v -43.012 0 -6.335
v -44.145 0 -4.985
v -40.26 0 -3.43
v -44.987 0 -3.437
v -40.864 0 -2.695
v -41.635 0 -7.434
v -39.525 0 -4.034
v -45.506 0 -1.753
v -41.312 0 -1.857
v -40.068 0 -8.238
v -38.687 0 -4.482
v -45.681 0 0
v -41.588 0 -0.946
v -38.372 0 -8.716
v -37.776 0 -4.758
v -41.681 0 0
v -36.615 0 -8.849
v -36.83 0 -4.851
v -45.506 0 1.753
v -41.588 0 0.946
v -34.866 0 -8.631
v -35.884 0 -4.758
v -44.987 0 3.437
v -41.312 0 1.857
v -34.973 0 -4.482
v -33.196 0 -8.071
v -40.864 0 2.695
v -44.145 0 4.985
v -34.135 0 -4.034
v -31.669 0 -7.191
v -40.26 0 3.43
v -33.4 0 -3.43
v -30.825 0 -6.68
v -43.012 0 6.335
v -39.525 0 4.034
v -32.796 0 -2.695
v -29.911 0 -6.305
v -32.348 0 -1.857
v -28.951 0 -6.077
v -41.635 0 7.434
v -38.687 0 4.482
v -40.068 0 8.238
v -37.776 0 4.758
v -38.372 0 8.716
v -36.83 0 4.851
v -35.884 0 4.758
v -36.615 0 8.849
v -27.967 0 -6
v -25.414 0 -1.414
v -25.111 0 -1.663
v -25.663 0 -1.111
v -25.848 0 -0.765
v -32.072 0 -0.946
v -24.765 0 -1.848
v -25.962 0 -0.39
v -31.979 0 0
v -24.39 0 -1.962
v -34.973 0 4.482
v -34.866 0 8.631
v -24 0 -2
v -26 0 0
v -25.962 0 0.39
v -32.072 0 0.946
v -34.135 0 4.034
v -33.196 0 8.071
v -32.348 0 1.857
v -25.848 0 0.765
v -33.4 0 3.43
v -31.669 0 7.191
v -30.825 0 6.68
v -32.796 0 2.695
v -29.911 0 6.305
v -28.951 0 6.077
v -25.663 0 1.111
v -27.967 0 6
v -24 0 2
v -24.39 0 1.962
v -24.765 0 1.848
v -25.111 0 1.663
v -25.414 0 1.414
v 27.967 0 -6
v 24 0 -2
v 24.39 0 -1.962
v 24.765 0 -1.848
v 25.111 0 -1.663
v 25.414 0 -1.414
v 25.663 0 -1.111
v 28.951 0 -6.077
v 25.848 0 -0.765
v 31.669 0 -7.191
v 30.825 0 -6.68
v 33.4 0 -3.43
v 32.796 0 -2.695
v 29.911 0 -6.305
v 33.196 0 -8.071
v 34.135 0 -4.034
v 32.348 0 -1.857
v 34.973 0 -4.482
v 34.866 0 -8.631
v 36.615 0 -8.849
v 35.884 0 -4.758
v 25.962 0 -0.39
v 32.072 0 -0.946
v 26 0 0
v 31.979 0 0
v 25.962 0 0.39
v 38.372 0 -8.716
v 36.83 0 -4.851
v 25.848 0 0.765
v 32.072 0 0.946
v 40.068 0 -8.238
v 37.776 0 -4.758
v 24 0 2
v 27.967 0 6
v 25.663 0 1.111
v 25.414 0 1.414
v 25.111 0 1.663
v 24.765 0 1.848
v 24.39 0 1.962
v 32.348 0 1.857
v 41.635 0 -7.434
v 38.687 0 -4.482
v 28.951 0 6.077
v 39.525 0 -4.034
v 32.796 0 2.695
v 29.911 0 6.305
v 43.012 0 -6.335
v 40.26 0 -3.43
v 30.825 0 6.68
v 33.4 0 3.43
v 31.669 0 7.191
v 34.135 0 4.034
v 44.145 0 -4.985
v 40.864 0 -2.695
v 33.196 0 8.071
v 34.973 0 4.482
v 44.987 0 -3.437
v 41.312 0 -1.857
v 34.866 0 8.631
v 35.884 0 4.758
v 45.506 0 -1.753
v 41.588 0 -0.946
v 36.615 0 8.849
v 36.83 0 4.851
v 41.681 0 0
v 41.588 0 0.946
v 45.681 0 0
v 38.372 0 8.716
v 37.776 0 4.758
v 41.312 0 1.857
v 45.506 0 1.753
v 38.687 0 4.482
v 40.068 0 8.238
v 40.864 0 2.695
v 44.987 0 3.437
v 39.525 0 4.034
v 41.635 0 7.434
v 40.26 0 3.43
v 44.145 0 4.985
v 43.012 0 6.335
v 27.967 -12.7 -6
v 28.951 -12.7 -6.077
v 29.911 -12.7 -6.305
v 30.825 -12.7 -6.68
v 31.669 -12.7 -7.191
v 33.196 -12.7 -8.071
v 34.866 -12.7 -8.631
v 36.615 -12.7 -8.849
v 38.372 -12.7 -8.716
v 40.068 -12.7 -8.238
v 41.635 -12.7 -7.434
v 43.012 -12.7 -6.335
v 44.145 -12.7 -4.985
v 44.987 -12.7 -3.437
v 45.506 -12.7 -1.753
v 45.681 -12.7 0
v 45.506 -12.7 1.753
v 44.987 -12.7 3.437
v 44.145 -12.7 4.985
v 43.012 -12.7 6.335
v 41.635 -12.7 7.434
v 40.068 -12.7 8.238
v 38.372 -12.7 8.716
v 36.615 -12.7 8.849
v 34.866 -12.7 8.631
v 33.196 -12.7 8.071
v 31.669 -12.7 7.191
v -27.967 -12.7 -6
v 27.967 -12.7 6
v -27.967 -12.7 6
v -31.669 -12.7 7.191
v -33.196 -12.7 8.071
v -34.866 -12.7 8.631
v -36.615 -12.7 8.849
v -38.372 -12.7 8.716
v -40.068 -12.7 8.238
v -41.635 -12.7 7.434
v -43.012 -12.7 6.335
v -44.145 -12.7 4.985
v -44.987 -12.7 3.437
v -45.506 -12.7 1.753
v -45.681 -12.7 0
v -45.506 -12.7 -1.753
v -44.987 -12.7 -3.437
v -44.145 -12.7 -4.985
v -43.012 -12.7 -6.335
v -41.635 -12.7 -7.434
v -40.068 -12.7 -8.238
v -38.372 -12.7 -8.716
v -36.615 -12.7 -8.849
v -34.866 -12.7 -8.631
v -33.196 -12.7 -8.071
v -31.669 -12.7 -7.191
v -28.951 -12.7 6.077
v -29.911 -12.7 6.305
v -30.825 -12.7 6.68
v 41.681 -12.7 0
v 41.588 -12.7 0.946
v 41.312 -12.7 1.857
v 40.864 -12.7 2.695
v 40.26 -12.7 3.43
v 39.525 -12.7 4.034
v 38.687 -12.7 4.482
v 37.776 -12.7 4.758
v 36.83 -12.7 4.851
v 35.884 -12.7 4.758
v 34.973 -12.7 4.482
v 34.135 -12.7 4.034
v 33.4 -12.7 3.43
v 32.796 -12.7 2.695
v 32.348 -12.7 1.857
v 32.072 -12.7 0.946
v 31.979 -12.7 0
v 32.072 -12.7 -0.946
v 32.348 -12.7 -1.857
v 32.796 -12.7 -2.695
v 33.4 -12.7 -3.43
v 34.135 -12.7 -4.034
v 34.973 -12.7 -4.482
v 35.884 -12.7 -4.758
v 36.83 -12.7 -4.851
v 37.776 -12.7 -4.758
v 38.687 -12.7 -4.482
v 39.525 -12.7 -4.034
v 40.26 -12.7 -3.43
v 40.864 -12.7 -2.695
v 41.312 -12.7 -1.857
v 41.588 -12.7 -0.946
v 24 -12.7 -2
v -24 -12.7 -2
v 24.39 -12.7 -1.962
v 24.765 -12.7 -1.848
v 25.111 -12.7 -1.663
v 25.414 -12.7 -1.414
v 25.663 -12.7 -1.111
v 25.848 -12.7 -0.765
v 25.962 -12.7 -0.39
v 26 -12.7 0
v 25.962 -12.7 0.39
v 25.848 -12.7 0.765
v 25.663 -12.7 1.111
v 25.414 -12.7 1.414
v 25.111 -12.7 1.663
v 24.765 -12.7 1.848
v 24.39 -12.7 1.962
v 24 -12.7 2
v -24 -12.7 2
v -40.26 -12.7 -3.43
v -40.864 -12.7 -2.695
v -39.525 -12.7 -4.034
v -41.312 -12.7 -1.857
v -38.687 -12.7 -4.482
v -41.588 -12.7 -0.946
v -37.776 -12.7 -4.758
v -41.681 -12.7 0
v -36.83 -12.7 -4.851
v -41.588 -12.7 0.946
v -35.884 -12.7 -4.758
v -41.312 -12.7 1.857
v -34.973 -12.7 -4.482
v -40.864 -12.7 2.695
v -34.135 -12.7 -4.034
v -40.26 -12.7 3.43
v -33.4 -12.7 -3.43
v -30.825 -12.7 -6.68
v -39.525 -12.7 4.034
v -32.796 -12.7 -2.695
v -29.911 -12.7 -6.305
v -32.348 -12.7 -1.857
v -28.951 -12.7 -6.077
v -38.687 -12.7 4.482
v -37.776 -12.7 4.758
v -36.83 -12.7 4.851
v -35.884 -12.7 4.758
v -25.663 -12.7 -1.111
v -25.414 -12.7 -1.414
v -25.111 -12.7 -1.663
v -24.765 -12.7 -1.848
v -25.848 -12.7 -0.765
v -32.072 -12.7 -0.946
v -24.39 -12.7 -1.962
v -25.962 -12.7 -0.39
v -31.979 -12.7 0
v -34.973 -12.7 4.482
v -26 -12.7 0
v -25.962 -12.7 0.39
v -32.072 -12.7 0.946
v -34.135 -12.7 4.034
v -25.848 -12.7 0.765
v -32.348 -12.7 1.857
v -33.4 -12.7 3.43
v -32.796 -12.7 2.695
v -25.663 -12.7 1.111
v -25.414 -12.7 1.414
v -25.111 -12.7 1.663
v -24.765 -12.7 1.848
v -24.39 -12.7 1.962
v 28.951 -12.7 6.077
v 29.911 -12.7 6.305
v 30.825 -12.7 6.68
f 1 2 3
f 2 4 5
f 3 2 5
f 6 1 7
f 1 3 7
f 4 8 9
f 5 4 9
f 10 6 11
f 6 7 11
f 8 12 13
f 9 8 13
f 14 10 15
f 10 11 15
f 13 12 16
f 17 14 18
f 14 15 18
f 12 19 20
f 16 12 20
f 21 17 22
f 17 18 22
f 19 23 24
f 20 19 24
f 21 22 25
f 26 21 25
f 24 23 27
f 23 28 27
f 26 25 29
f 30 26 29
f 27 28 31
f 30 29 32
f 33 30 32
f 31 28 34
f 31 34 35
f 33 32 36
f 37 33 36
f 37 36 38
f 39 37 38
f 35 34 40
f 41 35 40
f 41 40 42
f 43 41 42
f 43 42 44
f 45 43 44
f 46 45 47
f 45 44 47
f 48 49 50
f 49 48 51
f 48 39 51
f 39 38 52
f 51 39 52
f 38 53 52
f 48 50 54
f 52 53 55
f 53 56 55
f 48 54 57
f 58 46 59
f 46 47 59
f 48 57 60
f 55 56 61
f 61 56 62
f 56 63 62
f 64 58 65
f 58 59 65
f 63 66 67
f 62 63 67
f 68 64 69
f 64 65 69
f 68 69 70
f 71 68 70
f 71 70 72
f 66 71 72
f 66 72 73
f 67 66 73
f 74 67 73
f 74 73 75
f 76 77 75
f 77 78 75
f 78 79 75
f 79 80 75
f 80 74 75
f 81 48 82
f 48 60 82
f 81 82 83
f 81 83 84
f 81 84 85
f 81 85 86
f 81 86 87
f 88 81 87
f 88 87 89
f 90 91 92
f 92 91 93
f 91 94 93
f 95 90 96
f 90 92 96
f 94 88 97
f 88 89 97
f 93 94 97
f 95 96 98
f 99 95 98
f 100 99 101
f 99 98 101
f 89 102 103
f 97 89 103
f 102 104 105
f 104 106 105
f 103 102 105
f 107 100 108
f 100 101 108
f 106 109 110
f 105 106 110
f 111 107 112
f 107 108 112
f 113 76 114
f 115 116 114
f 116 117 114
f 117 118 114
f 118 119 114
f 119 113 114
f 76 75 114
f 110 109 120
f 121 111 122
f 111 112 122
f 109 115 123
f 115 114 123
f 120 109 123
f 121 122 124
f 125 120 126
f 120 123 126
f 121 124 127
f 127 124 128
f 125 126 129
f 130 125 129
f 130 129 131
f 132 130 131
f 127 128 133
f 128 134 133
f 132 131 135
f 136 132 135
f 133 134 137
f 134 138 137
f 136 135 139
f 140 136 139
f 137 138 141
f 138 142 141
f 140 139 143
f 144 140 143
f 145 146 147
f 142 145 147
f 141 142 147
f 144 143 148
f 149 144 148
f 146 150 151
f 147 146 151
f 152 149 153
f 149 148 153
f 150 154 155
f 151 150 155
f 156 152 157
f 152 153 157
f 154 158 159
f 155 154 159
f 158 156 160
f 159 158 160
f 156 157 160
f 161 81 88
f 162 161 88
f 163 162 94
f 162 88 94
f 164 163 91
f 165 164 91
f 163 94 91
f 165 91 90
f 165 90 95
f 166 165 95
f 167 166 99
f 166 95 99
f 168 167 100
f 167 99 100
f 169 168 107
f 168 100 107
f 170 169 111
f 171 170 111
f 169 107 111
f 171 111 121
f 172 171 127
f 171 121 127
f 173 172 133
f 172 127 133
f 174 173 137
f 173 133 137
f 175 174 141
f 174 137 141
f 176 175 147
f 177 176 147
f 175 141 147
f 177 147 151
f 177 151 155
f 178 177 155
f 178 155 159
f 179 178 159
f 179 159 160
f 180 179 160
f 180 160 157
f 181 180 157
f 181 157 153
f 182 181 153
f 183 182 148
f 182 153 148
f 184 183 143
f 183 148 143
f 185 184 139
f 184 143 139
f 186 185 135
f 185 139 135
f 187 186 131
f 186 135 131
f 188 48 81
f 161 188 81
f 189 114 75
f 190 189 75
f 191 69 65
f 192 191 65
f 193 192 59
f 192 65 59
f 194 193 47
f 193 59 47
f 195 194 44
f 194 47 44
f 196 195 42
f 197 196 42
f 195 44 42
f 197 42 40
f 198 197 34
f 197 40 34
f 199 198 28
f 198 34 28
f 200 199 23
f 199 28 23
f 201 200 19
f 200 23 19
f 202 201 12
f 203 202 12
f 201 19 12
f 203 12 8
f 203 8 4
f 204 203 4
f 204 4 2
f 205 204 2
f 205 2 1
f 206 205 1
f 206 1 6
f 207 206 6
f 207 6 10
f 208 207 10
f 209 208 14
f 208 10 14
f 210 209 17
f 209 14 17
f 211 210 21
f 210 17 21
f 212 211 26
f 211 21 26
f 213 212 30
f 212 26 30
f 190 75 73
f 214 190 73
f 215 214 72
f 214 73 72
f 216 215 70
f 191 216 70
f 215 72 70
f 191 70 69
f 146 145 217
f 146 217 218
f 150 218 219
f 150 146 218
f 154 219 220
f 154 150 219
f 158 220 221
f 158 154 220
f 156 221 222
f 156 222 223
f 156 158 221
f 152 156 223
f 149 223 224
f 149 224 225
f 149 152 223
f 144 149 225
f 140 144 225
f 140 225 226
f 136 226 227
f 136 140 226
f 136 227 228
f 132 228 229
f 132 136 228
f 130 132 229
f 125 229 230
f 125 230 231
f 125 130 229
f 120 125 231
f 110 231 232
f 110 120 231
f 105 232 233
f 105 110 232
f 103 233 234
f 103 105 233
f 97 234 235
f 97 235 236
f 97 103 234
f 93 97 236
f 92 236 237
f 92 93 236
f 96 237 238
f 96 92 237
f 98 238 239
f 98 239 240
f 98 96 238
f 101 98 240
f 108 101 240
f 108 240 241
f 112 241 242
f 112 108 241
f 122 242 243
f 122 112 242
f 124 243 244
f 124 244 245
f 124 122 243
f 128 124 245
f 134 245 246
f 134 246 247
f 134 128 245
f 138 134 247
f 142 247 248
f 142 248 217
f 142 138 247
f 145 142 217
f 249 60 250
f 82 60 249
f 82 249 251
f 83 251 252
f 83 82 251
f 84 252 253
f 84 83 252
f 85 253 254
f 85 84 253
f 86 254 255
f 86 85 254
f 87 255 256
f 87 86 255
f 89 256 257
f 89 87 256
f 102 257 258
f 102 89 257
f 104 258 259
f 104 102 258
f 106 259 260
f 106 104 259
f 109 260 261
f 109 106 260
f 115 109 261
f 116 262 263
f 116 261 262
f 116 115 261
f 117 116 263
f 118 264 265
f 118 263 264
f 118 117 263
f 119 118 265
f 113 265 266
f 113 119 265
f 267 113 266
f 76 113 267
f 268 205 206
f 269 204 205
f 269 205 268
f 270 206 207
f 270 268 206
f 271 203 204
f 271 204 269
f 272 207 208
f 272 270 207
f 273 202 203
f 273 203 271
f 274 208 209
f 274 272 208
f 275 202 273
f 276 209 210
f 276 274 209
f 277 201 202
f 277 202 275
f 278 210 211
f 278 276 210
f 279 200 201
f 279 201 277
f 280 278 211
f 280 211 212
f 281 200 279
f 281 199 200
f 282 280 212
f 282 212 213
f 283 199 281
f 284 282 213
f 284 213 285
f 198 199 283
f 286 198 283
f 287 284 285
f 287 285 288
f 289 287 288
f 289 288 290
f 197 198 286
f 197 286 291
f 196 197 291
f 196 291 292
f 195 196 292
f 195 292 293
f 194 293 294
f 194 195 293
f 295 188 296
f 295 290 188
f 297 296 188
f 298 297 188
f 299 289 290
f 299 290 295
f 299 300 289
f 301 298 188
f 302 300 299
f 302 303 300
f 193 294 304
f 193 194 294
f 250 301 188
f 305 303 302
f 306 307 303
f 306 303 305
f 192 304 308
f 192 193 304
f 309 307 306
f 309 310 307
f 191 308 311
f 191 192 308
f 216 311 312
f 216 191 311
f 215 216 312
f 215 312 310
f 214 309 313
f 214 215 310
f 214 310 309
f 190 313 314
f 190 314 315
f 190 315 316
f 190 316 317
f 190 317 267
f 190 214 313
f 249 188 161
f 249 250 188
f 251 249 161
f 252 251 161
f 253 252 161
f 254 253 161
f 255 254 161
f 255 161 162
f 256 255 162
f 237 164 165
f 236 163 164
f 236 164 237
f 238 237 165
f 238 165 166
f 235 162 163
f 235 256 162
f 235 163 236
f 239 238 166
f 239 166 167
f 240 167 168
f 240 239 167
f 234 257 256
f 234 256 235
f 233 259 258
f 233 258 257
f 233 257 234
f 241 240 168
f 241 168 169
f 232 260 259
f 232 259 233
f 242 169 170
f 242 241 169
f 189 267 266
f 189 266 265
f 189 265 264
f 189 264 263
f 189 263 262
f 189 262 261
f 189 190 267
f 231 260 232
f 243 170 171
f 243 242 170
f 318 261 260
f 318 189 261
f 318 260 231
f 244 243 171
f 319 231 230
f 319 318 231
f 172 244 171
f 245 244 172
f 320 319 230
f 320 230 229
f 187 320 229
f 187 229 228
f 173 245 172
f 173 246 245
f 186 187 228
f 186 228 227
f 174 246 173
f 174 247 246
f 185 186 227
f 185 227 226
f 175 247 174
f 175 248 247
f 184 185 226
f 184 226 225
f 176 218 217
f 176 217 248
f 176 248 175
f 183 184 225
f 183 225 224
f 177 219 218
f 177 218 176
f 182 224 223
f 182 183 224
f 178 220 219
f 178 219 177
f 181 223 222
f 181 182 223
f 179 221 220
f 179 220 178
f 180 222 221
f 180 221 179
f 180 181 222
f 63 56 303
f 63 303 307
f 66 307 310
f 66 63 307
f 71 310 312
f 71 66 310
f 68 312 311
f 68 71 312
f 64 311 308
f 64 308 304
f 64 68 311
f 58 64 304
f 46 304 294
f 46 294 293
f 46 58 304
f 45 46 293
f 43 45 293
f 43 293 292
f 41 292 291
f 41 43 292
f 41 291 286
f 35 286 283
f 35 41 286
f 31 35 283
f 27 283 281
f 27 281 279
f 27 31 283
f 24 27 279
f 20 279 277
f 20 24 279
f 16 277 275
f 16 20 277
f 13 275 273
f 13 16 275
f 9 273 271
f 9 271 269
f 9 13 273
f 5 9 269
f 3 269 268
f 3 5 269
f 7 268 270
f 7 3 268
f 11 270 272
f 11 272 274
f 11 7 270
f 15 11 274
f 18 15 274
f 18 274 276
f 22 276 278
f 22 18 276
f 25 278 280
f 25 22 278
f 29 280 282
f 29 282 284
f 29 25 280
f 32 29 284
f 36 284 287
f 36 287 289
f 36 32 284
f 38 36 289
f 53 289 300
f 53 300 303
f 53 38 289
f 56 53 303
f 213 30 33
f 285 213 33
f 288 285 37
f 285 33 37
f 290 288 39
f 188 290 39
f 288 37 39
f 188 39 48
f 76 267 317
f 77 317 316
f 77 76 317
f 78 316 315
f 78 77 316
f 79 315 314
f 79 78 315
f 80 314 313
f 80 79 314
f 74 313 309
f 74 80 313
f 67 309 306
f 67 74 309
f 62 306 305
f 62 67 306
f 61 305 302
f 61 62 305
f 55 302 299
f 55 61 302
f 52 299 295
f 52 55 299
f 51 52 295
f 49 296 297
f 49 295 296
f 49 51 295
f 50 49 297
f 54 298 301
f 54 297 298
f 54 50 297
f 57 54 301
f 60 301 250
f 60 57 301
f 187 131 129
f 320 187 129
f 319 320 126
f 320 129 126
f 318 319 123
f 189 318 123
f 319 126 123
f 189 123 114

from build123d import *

# Parameters (mm, degrees)
F1_R     = 4.8514
F2_DEPTH = 12.7
F4_DEPTH = 12.701


with BuildPart() as f2:
    # F1 (on Front) → F2 (new body)
    with BuildSketch(Plane.XZ):
        with BuildLine():
            ThreePointArc((-27.966589, 6), (-29.911259, 6.305105), (-31.669054, 7.1911))
            ThreePointArc((-31.669054, 7.1911), (-45.6814, 0), (-31.669054, -7.1911))
            ThreePointArc((-31.669054, -7.1911), (-29.911259, -6.305105), (-27.966589, -6))
            Line((-27.966589, -6), (27.966589, -6))
            ThreePointArc((27.966589, -6), (29.911259, -6.305105), (31.669054, -7.1911))
            ThreePointArc((31.669054, -7.1911), (45.6814, 0), (31.669054, 7.1911))
            ThreePointArc((31.669054, 7.1911), (29.911259, 6.305105), (27.966589, 6))
            Line((27.966589, 6), (-27.966589, 6))
        make_face()
        with Locations((-36.83, 0)):
            Circle(F1_R, mode=Mode.SUBTRACT)
        with Locations((36.83, 0)):
            Circle(F1_R, mode=Mode.SUBTRACT)
    extrude(amount=F2_DEPTH)

    # F3 (on Front) → F4 (cut, through all)
    with BuildSketch(Plane.XZ):
        with BuildLine():
            ThreePointArc((-24, 2), (-26, 0), (-24, -2))
            Line((-24, -2), (24, -2))
            ThreePointArc((24, -2), (26, 0), (24, 2))
            Line((24, 2), (-24, 2))
        make_face()
    extrude(amount=F4_DEPTH, mode=Mode.SUBTRACT)


solid = f2.part
